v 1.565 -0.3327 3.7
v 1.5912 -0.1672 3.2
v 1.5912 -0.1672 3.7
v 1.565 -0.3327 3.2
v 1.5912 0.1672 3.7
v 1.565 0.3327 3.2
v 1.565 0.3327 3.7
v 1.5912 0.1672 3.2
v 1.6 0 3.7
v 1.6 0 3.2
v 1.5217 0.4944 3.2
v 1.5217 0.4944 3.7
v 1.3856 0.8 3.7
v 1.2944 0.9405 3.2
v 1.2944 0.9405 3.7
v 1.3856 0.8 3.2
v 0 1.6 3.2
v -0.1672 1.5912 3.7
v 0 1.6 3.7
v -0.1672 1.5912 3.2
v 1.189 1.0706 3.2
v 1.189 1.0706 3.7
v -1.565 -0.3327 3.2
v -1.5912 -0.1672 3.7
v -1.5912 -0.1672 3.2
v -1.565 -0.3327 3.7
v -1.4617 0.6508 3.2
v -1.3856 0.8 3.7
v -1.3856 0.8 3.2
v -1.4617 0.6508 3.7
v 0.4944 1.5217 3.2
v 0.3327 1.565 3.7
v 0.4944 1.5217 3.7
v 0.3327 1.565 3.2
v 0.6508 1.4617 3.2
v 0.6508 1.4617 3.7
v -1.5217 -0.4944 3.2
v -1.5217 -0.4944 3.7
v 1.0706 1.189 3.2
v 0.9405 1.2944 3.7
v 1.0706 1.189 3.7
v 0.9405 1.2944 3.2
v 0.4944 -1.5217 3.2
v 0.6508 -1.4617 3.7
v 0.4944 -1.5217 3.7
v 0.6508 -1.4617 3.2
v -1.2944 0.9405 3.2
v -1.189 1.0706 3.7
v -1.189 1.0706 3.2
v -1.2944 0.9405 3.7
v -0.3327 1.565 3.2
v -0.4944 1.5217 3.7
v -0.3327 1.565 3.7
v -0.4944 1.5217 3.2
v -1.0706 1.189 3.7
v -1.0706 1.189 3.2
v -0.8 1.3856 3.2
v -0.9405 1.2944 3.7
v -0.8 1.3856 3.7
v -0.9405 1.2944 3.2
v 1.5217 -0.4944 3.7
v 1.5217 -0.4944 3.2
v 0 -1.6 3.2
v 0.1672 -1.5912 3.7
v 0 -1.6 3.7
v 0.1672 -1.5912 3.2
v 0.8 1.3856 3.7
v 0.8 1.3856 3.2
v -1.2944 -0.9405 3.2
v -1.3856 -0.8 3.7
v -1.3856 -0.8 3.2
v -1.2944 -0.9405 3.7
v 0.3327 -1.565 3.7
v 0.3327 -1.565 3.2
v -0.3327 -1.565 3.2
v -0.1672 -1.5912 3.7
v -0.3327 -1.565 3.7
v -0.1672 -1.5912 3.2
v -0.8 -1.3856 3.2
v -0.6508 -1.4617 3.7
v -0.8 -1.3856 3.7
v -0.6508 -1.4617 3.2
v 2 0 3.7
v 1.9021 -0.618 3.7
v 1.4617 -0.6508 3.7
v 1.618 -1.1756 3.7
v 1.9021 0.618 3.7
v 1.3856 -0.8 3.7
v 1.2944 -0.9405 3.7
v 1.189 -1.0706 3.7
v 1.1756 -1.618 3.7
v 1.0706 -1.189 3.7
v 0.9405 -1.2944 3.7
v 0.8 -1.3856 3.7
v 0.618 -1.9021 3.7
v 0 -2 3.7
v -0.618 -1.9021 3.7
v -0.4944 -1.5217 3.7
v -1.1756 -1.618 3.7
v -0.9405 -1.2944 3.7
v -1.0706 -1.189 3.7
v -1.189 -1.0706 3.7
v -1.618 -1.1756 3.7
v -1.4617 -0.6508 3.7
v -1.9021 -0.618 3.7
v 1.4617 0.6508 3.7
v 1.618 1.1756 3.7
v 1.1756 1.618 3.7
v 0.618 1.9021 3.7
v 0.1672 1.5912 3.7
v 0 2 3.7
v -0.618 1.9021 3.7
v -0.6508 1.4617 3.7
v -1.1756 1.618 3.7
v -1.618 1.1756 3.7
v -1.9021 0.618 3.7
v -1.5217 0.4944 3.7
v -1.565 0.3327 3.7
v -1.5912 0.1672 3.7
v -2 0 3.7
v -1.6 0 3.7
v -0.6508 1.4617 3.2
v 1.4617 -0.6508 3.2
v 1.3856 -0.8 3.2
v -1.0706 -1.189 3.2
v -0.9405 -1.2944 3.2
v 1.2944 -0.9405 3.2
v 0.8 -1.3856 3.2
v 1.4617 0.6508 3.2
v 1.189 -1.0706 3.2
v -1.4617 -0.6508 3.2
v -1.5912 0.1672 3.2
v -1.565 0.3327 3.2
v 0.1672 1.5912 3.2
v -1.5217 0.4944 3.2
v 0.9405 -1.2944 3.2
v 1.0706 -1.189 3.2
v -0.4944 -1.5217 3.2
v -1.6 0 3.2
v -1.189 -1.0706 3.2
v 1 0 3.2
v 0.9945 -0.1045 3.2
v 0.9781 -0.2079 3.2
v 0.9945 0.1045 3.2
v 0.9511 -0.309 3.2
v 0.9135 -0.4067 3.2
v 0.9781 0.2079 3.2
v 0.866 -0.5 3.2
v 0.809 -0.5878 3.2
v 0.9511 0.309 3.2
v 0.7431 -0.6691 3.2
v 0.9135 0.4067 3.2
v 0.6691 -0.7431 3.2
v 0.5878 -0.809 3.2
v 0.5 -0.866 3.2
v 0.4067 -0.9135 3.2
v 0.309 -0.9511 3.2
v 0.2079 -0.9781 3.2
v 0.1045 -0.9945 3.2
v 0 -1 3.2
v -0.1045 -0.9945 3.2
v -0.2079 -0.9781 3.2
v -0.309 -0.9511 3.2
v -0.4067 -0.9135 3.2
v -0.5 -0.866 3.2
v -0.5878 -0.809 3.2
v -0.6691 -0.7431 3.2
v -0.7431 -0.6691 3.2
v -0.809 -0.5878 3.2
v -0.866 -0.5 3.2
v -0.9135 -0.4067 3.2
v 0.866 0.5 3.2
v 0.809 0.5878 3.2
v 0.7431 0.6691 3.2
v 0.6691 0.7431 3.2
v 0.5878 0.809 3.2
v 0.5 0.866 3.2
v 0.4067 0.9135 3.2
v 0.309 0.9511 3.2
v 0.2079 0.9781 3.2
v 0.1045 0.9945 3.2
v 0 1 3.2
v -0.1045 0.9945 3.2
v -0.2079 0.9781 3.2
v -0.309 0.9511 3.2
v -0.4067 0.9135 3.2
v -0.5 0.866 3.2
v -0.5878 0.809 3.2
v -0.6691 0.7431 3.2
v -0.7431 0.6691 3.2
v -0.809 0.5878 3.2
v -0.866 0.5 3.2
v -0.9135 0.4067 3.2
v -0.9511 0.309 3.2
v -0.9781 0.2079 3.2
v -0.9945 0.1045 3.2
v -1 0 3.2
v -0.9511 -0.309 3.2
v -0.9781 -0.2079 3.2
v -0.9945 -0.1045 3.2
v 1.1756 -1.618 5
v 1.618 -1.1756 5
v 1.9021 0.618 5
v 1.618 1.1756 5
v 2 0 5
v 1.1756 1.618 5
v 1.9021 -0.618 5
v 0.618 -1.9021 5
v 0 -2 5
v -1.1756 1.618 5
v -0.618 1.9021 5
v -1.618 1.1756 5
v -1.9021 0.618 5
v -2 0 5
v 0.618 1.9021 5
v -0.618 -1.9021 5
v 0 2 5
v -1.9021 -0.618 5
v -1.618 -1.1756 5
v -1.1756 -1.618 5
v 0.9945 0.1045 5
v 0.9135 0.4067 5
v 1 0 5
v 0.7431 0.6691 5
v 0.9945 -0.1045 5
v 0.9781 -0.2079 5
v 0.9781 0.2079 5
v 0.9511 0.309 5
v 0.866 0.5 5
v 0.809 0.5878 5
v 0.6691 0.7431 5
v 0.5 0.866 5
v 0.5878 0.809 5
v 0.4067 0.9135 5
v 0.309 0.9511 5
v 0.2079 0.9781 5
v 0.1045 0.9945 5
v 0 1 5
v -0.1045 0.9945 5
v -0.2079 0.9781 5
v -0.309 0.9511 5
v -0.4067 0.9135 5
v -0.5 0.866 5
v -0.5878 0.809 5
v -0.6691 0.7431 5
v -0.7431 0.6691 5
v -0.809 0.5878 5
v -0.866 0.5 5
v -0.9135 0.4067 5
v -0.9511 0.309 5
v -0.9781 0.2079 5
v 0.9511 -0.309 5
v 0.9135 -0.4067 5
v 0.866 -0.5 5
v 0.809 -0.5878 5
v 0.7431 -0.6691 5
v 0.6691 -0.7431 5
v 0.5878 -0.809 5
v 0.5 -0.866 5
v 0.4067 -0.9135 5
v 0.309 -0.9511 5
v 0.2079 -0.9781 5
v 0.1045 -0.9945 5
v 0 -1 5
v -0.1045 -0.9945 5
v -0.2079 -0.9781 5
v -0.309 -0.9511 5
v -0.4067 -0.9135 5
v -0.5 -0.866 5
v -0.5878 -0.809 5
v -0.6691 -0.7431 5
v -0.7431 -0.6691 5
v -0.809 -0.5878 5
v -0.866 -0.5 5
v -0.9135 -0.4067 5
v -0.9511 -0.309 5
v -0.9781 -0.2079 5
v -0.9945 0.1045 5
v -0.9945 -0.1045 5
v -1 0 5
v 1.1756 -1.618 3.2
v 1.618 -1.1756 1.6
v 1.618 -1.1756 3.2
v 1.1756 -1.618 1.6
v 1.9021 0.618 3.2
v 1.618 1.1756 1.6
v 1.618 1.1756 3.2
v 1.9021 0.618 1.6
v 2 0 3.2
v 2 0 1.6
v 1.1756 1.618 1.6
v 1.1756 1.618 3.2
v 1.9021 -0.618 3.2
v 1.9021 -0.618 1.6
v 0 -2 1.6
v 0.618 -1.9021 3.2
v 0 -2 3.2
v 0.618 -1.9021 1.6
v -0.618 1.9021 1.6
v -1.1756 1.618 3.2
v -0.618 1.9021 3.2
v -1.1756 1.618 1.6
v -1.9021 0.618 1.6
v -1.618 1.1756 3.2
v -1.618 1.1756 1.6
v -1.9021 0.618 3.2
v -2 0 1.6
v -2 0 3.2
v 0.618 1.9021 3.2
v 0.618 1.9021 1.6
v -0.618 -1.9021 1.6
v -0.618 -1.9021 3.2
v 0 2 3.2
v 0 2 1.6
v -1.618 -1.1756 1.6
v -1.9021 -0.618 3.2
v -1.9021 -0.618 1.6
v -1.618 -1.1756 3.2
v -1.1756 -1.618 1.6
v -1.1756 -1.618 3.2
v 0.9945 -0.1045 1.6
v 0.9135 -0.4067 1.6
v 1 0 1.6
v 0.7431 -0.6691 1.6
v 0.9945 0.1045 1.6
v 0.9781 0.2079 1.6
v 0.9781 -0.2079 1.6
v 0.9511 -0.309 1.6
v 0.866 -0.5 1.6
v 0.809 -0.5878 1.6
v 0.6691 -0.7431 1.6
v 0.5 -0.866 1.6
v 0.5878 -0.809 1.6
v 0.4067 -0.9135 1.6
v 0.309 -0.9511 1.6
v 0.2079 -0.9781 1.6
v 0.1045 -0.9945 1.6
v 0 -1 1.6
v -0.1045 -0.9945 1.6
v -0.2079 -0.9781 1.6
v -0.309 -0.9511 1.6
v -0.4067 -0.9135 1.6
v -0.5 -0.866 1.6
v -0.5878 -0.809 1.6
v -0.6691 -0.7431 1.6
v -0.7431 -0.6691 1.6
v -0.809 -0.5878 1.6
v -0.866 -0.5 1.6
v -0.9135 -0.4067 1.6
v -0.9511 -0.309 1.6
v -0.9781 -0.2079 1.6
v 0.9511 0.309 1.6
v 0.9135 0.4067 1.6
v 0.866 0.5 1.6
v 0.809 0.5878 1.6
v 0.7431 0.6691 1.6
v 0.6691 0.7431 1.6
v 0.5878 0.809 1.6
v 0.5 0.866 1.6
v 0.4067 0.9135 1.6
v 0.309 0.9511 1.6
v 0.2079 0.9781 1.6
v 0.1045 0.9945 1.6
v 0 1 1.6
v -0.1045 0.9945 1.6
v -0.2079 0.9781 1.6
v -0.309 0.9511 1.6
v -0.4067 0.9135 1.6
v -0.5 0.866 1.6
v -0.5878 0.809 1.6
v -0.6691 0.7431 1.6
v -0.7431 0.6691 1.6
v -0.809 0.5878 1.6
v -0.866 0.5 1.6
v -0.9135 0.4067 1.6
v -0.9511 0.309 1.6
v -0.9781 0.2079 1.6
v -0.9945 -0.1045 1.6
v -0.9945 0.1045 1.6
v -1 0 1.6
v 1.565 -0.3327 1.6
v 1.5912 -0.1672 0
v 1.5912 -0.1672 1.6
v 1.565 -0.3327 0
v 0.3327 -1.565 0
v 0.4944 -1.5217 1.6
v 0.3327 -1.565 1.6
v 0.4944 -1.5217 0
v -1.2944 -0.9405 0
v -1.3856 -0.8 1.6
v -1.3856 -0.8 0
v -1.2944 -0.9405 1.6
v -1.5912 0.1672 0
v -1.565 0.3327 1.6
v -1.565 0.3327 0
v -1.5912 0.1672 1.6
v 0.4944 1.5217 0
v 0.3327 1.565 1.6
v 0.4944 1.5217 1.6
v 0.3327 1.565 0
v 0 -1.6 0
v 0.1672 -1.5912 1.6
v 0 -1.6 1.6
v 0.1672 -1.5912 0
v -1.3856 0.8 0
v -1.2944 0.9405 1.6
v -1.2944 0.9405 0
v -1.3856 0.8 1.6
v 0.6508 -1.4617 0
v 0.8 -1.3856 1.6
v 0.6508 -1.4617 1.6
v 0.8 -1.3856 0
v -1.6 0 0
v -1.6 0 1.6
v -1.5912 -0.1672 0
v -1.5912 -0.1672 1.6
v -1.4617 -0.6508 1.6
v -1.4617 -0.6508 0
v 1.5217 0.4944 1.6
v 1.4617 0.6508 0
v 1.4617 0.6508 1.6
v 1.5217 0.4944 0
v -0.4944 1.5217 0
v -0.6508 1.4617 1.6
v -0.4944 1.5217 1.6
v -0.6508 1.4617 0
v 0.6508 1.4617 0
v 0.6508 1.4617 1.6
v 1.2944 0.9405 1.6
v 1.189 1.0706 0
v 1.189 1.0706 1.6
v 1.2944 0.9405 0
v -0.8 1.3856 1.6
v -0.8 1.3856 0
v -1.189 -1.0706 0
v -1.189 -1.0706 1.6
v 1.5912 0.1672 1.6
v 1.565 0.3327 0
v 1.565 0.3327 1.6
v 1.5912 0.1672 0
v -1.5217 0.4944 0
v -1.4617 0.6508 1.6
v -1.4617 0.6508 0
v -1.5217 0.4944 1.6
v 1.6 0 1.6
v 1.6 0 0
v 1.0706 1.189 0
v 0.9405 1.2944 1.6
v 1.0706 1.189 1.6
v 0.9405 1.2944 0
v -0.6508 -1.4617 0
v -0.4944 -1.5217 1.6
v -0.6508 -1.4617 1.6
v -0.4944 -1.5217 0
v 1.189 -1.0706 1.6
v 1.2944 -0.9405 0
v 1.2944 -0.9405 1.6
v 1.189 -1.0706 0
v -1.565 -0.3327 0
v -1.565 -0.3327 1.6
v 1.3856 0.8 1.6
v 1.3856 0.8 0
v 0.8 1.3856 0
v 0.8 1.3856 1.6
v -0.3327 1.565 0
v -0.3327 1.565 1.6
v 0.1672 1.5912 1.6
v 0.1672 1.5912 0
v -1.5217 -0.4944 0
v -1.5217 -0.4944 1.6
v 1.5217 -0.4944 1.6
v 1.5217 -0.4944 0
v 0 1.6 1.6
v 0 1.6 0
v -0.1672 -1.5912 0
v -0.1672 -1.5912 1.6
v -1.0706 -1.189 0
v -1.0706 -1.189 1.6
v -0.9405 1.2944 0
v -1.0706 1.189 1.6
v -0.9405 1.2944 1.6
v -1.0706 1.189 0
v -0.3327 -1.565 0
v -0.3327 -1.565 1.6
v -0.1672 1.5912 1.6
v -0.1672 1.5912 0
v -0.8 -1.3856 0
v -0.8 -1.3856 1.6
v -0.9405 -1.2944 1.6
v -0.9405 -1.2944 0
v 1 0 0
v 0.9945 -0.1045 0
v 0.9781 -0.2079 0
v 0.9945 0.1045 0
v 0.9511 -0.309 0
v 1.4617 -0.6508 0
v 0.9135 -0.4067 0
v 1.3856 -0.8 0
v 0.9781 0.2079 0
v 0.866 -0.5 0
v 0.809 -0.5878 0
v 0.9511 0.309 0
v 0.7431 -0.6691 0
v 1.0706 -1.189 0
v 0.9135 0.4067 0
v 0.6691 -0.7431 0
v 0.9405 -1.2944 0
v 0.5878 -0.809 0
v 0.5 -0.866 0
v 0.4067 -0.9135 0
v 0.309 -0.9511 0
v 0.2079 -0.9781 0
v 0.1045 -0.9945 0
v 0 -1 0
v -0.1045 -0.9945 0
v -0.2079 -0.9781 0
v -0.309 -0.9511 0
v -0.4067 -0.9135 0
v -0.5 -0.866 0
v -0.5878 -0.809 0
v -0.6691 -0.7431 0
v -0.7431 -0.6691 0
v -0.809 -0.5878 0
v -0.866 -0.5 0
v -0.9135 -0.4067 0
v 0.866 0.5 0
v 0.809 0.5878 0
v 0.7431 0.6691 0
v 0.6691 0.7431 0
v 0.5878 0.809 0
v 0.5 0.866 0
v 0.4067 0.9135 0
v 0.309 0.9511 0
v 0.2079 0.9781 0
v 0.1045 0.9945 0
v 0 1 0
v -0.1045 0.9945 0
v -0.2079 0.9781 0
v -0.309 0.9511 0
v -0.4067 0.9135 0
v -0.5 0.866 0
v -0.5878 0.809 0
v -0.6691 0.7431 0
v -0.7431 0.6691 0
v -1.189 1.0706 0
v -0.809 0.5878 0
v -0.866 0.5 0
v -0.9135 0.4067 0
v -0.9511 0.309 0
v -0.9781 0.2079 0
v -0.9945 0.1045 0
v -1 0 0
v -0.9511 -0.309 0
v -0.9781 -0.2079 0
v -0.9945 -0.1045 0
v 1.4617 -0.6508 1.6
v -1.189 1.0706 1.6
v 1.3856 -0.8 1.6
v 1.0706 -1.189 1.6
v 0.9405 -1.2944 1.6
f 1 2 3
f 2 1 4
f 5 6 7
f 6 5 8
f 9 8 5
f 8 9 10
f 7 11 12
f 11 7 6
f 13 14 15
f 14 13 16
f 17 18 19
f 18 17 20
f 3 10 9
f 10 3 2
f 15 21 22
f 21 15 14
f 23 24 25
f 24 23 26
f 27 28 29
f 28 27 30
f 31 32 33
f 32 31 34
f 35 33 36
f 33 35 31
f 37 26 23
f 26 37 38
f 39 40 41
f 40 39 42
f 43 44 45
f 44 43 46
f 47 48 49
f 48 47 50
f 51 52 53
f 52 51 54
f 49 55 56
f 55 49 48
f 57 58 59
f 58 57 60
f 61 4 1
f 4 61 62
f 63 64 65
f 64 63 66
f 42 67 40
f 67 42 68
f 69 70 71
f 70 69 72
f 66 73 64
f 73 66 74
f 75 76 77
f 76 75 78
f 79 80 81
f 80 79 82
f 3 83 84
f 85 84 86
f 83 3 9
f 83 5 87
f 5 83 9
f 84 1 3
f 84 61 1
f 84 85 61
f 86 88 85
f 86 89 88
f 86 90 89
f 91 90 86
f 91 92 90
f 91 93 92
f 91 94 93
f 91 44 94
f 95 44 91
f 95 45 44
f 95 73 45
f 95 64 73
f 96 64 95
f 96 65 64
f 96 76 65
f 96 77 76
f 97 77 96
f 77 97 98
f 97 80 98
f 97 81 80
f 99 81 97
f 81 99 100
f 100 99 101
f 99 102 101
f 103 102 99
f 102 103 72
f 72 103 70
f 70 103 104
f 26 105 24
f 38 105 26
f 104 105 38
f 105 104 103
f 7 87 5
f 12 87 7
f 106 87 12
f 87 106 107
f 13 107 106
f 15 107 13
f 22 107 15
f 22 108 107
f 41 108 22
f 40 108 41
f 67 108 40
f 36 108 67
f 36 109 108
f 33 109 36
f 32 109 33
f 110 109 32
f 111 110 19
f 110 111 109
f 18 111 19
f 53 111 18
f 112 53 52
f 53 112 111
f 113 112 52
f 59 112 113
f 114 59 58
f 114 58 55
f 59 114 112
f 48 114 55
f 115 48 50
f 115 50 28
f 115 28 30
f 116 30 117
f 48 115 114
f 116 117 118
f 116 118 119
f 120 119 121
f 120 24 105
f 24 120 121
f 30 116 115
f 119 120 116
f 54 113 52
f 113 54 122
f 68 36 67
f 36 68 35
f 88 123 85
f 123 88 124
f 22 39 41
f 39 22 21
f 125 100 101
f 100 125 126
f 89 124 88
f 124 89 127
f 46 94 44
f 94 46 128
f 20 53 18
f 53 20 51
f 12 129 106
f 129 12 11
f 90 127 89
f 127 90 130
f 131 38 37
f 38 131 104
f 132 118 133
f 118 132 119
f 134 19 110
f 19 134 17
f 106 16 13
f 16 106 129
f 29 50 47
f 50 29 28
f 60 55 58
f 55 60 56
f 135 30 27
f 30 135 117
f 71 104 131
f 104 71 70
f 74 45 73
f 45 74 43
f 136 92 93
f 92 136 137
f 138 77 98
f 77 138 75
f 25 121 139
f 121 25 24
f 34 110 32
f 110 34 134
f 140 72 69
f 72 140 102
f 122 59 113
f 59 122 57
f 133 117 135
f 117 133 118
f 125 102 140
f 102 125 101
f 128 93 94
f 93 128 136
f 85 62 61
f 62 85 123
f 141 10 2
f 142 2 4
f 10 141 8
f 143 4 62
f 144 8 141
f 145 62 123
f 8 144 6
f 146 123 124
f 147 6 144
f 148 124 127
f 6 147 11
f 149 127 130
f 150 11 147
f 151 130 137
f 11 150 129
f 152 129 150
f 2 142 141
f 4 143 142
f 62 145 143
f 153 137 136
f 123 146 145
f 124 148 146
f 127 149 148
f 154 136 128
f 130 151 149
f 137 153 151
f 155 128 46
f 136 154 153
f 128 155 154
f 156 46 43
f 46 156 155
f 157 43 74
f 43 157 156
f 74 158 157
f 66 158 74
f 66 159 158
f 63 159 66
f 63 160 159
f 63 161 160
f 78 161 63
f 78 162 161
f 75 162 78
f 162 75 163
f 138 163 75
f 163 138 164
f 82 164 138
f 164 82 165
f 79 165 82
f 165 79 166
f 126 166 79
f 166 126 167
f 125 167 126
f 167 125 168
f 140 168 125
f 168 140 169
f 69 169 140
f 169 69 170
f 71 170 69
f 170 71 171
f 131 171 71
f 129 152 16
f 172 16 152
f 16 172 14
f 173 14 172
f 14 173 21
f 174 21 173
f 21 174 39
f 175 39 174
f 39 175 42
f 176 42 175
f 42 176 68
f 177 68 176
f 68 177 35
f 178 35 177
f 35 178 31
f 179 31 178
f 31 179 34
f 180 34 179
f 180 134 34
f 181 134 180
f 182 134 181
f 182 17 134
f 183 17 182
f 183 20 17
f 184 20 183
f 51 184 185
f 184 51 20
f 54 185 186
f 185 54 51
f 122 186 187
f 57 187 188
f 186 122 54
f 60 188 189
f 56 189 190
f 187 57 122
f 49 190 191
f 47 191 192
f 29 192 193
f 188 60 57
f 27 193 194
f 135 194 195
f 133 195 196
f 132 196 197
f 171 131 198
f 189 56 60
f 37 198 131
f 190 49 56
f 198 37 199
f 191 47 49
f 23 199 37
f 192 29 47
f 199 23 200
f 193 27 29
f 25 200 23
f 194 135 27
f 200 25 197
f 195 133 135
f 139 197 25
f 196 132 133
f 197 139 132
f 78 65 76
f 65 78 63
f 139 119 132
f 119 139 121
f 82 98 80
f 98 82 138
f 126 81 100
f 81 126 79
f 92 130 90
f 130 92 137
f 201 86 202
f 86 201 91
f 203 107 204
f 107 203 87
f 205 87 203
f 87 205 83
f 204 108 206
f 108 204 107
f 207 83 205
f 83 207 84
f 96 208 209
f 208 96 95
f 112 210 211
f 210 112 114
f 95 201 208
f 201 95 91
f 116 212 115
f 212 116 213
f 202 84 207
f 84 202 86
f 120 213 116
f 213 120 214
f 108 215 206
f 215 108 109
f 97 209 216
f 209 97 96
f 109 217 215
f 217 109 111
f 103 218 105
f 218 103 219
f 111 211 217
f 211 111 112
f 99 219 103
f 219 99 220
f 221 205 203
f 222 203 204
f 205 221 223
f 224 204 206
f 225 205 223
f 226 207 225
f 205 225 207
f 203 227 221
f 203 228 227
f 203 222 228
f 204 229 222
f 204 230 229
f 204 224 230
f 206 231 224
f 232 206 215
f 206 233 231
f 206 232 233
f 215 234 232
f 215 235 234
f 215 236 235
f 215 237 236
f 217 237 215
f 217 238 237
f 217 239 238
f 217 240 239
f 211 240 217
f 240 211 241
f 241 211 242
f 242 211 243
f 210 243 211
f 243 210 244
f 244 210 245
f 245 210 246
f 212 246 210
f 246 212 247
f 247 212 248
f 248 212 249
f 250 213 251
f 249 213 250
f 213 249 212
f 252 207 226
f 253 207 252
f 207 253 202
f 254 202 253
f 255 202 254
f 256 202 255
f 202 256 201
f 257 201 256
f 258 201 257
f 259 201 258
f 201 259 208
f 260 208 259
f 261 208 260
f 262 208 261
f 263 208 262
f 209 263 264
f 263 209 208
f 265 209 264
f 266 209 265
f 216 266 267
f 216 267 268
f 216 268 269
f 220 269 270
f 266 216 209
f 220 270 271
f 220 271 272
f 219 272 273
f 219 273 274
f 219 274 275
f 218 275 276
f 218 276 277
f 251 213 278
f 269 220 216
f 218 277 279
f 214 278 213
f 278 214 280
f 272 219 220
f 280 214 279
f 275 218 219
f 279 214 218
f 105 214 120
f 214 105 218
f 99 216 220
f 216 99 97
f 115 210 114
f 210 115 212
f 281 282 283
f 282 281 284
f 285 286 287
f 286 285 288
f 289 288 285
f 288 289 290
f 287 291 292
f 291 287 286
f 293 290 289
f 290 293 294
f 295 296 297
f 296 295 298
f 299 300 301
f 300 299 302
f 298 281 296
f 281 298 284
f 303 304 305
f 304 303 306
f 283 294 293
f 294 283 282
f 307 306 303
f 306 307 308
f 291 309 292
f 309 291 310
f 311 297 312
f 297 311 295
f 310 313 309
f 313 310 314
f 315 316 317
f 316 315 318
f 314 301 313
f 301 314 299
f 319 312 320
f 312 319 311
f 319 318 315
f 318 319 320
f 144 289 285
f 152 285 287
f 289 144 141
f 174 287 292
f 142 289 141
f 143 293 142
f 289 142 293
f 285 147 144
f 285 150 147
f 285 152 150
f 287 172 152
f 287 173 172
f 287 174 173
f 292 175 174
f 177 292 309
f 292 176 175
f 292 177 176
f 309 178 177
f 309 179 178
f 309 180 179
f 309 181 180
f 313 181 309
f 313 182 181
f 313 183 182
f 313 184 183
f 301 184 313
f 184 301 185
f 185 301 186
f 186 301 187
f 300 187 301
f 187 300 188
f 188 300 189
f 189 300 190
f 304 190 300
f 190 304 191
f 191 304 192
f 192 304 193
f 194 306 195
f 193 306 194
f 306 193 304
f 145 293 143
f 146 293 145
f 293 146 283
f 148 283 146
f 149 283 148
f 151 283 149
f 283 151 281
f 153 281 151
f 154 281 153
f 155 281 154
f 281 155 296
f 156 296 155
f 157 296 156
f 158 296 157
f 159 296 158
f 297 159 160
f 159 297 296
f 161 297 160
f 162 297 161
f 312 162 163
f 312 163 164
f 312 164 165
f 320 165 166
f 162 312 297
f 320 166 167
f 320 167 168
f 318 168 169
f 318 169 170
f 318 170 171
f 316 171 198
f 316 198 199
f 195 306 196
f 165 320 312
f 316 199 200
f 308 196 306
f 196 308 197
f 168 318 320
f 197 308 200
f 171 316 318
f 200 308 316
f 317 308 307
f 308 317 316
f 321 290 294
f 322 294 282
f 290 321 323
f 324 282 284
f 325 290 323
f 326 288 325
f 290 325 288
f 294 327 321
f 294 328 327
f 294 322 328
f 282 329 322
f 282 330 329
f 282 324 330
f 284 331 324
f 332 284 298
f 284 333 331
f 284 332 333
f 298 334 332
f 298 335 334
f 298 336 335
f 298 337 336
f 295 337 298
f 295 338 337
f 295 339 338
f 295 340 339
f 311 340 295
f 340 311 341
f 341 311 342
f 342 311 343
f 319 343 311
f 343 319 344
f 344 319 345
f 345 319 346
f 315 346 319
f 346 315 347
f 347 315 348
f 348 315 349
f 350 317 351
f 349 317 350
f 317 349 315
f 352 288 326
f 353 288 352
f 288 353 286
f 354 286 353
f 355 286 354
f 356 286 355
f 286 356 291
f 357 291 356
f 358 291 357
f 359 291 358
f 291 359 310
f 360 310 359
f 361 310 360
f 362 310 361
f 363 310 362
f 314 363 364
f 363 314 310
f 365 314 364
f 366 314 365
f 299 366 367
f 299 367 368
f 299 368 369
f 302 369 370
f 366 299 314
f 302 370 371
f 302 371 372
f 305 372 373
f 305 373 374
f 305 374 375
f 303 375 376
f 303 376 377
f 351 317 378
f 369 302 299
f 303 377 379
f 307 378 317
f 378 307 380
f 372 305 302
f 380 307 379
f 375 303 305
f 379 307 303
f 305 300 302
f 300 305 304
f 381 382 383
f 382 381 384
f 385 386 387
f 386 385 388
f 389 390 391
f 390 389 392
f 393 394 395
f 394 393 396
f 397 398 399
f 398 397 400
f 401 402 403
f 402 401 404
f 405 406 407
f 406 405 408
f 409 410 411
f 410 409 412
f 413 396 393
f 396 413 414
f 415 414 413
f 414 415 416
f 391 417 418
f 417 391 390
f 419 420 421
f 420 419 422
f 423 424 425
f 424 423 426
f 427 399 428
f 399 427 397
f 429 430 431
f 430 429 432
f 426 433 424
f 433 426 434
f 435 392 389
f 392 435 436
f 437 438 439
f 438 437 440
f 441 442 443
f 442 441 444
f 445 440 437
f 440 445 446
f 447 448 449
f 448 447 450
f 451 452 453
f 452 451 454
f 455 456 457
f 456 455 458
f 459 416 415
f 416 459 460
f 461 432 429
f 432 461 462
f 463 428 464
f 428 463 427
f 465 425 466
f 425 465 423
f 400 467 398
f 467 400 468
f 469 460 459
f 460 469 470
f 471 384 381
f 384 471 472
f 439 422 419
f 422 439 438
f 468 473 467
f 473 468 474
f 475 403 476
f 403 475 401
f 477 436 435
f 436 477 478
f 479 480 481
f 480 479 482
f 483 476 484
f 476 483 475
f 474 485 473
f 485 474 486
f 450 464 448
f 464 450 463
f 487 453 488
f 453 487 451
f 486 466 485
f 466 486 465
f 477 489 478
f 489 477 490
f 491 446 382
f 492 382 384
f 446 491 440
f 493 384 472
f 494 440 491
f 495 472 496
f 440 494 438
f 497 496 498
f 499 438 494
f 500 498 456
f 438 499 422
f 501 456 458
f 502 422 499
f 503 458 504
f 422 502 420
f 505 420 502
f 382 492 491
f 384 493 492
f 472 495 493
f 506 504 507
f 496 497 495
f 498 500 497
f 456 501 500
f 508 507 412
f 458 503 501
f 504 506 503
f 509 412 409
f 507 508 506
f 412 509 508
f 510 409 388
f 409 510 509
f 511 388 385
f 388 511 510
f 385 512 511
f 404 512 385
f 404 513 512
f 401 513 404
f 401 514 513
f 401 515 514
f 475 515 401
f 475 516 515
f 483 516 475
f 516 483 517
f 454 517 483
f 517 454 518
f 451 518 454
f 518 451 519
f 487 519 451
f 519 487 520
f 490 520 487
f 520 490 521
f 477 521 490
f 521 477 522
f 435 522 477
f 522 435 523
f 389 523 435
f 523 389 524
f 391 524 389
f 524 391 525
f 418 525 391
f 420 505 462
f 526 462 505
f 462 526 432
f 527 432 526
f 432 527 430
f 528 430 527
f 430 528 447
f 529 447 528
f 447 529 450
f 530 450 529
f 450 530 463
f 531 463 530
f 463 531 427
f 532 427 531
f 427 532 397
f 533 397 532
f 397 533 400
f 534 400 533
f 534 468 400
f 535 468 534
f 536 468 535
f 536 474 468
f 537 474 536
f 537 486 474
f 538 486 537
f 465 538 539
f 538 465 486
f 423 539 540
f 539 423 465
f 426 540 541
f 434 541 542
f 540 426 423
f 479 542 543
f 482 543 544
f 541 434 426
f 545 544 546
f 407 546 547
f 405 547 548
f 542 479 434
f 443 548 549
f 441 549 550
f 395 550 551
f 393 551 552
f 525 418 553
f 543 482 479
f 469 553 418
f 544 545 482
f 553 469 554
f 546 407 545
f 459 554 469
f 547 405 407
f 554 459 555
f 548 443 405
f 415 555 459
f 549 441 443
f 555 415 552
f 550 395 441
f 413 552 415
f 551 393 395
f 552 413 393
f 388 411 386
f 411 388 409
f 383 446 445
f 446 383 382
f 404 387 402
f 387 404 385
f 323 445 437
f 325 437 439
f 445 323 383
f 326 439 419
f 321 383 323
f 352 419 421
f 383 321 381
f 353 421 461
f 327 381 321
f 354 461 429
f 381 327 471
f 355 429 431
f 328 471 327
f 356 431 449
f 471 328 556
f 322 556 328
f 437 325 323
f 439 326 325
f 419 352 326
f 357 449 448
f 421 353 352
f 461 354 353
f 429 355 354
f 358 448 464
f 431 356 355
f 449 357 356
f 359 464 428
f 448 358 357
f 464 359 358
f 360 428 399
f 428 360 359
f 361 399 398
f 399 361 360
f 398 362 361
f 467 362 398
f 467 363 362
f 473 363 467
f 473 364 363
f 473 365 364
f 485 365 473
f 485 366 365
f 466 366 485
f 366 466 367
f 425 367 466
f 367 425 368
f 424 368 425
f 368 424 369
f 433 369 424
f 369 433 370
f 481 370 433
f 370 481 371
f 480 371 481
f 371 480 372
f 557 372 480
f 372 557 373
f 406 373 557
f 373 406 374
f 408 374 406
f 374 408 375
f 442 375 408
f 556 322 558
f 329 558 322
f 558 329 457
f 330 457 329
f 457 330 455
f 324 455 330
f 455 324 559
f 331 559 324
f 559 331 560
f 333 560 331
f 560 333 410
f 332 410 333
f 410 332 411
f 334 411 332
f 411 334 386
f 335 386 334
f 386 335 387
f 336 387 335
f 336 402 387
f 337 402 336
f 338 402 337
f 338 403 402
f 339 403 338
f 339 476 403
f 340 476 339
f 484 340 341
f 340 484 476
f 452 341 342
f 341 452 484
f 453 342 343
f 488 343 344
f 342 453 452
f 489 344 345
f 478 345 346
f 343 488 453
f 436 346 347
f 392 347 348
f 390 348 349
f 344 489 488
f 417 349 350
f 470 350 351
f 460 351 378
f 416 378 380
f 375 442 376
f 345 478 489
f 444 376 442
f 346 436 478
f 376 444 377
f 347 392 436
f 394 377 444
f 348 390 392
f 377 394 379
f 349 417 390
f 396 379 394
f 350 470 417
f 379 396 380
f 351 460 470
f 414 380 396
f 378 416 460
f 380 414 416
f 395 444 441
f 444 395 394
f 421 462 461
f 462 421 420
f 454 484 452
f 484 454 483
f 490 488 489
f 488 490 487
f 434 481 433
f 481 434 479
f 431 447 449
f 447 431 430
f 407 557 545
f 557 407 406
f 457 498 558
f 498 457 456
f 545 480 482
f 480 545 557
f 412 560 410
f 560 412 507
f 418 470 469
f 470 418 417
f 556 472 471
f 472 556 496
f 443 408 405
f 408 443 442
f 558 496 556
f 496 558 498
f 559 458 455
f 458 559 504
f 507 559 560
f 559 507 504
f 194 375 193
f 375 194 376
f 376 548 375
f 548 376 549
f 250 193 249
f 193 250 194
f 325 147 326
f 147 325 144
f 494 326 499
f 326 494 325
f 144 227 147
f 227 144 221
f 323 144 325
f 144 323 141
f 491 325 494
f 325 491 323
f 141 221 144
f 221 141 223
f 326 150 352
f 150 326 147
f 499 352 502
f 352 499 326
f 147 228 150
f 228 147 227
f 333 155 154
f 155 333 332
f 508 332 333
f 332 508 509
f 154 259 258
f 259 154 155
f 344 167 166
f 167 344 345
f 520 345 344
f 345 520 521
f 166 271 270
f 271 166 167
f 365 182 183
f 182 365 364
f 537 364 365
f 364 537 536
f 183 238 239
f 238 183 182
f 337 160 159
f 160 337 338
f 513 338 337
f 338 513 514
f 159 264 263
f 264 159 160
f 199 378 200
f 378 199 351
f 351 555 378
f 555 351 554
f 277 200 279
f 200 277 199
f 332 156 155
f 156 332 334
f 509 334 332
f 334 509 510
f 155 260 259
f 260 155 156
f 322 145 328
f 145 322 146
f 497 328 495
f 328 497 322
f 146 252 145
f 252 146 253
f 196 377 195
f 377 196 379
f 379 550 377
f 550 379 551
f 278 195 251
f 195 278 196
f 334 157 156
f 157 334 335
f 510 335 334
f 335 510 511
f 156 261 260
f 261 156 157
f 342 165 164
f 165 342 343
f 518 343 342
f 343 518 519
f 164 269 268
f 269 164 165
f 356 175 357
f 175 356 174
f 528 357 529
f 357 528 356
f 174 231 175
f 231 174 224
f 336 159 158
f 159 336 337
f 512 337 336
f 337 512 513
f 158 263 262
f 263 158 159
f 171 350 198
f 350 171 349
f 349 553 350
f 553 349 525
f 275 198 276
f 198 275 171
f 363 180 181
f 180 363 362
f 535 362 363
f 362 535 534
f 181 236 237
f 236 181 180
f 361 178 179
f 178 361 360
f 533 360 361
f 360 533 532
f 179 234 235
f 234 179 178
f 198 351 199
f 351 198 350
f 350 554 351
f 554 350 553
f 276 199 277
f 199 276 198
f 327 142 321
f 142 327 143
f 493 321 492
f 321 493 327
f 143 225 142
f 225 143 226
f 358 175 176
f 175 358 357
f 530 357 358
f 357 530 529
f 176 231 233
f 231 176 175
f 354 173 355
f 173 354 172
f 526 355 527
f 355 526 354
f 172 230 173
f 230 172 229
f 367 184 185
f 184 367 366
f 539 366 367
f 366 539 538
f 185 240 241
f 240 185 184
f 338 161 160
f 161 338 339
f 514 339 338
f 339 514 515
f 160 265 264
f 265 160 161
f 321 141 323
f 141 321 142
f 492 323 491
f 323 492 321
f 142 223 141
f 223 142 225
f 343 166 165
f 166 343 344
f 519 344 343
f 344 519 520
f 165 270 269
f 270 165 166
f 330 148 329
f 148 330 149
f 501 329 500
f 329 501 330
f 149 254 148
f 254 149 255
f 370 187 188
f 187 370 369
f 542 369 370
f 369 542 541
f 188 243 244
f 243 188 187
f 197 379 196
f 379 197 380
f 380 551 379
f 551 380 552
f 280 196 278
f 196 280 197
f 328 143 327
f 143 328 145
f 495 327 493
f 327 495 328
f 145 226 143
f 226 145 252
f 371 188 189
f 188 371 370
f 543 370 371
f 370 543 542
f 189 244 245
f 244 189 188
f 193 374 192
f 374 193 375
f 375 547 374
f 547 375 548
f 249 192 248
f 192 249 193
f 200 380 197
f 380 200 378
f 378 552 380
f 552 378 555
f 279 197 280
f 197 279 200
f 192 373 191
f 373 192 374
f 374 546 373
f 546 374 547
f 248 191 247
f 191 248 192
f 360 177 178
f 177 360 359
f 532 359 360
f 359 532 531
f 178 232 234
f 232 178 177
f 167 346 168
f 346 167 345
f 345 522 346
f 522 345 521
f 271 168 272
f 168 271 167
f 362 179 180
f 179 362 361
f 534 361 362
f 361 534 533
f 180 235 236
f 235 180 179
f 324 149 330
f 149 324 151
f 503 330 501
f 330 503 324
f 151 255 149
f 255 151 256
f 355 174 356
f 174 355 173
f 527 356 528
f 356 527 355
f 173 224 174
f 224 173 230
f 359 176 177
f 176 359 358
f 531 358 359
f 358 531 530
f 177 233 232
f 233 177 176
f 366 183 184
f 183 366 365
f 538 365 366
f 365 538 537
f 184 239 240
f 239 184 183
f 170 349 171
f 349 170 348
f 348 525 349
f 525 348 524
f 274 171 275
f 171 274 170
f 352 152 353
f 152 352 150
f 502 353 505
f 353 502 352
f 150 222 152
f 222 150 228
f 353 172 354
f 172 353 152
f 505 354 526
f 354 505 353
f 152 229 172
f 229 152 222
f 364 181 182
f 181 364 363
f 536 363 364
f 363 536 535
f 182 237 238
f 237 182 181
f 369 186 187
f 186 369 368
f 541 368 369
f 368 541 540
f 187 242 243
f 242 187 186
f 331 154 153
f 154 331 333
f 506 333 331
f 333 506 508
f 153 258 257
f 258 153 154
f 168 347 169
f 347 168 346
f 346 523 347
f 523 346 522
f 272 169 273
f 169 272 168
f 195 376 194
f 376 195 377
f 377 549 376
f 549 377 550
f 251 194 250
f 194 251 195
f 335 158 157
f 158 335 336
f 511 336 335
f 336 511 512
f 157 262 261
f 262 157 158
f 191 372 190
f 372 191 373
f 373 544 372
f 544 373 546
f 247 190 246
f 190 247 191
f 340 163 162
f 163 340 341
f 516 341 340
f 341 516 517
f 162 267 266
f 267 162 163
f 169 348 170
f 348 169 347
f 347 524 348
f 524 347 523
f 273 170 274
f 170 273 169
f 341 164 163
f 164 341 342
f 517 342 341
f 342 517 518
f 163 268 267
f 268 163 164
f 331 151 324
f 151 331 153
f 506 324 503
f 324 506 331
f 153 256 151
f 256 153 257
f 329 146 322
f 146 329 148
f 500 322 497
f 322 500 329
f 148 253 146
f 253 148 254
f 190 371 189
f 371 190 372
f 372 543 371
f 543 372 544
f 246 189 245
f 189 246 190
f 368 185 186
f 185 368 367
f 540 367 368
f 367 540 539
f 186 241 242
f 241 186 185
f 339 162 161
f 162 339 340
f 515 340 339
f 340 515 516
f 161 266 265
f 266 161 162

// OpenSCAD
/**
 * Module: Placeholder for heat insert nut
 *
 * Author: Karim Aziiev <karim.aziiev@gmail.com>
 * License: GPL-3.0-or-later
 */

include <../colors.scad>

use <../lib/functions.scad>
use <../lib/plist.scad>
use <../lib/slots.scad>
use <../lib/transforms.scad>
use <bolt.scad>

heat_insert_plist_example = ["h", 5,
                             "d", 3.2,
                             "flang_d", 4,
                             "flang_h", 1.6,
                             "top_flang_h", 1.3,
                             "bottom_flat_h", 1.6,
                             "hole_d", 2];

/**
  ─────────────────────────────────────────────────────────────────────────────
  heat_insert_nut_props
  ─────────────────────────────────────────────────────────────────────────────

  Resolve insert dimensions and the maximum diameter of its mounting cutter.

  **Parameters:**
  - `plist`: Physical dimensions in mm, as accepted by heat_insert_nut_from_plist.

  **Returns:**
  The plist with optional dimensions/defaults resolved, plus outer_d, inner_h,
  slot_d, bore_d, bore_h, slot_bottom and slot_top. Unreversed cutter Z bounds
  include its boolean overshoot; the hardware occupies Z=0..h. slot_d includes both shaft
  and knurl clearances. The lower flange can interfere with the printed pocket
  before heat insertion; the cutter is not a clearance envelope of the hardware.
 */
function heat_insert_nut_props(plist) =
  let (h = plist_get("h", plist),
       d = plist_get("d", plist),
       hole_d = plist_get("hole_d", plist),
       flang_d = with_default(plist_get("flang_d", plist), d),
       flang_h = with_default(plist_get("flang_h", plist), 0),
       top_h = with_default(plist_get("top_flang_h", plist), flang_h),
       flat_h = with_default(plist_get("bottom_flat_h", plist), 0),
       clearance = with_default(plist_get("clearance", plist), 0.2),
       knurl_clearance = with_default(plist_get("knurl_clearance", plist), 0.6),
       taper = with_default(plist_get("use_taper", plist), false),
       bore_h = flat_h + flang_h / 2,
       bore_d = max(flang_d, d) + knurl_clearance,
       inner_h = h - flang_h - top_h - flat_h,
       slot_offset = 0.1,
       overshoot = 0.2)
  assert(is_num(h) && h > 0 && is_num(d) && d > 0
         && is_num(hole_d) && hole_d > 0 && hole_d < min(d, flang_d),
         "Insert height/diameters must be positive, with material around its thread")
  assert(min([flang_h, top_h, flat_h, inner_h, clearance, knurl_clearance]) >= 0,
         "Insert segments must fit h and clearances must be nonnegative")
  assert(!taper || h > bore_h + flat_h, "Insert taper needs positive height")
  plist_merge(plist,
              ["h", h,
               "d", d,
               "hole_d", hole_d,
               "flang_d", flang_d,
               "flang_h", flang_h,
               "top_flang_h", top_h,
               "bottom_flat_h", flat_h,
               "clearance", clearance,
               "knurl_clearance", knurl_clearance,
               "use_taper", taper,
               "bolt_head_type", with_default(plist_get("bolt_head_type", plist), "pan"),
               "outer_d", max(d, flang_d),
               "inner_h", inner_h,
               "slot_d", max(d + clearance, bore_h > 0 || taper ? bore_d : 0),
               "bore_d", bore_d,
               "bore_h", bore_h,
               "slot_offset", slot_offset,
               "slot_overshoot", overshoot,
               "slot_bottom", slot_offset - overshoot,
               "slot_top", h + slot_offset + overshoot]);

module heat_insert_nut(h,
                       d,
                       hole_d,
                       flang_d,
                       flang_h,
                       top_flang_h,
                       bottom_flat_h,
                       fn1=60,
                       fn2=20,
                       color=metallic_gold_2,
                       clearance=0.2,
                       knurl_clearance=0.6,
                       use_taper=false,
                       bolt_head_type="pan",
                       show_bolt=false,
                       reverse=false,
                       slot_mode=false,
                       anchor=[0, 0, 1],
                       bolt_l,
                       bolt_head_offset=0) {
  props = heat_insert_nut_props(["h", h,
                                 "d", d,
                                 "hole_d", hole_d,
                                 "flang_d", flang_d,
                                 "flang_h", flang_h,
                                 "top_flang_h", top_flang_h,
                                 "bottom_flat_h", bottom_flat_h,
                                 "clearance", clearance,
                                 "knurl_clearance", knurl_clearance,
                                 "use_taper", use_taper,
                                 "bolt_head_type", bolt_head_type]);
  bottom_flat_h = plist_get("bottom_flat_h", props);
  flang_d = plist_get("flang_d", props);
  flang_h = plist_get("flang_h", props);
  top_flang_h = plist_get("top_flang_h", props);
  inner_h = plist_get("inner_h", props);
  clearance = plist_get("clearance", props);
  use_taper = plist_get("use_taper", props);
  bolt_head_type = plist_get("bolt_head_type", props);
  bolt_l = with_default(bolt_l, h);
  fn1 = with_default(fn1, 60);
  fn2 = with_default(fn2, 20);
  color = with_default(color, metallic_gold_2);

  module _slot() {
    cbore_d = plist_get("bore_d", props);
    cbore_h = plist_get("bore_h", props);
    insert_d = d + clearance;
    translate([0, 0, plist_get("slot_offset", props)]) {
      counterbore(h=h,
                  d=insert_d,
                  bore_d=cbore_d,
                  bore_h=cbore_h,
                  sink=false,
                  fn=50,
                  autoscale_step=plist_get("slot_overshoot", props),
                  reverse=false);
    }
    if (use_taper) {
      translate([0, 0, bottom_flat_h]) {
        cylinder(d1=insert_d,
                 d2=cbore_d,
                 h=h - cbore_h - bottom_flat_h,
                 $fn=50);
      }
    }
  }

  with_anchor(anchor=anchor, size=[d, d, h], centered=true) {
    translate([0, 0, reverse ? h : 0]) {
      maybe_rotate([reverse ? 180 : 0, 0, 0]) {
        if (slot_mode) {
          _slot();
        } else  {
          color(color, alpha=1) {
            difference() {
              union() {
                cylinder(d=d, h=bottom_flat_h, $fn=fn1);
                translate([0, 0, bottom_flat_h]) {
                  cylinder(d=flang_d, h=flang_h, $fn=fn2);
                  translate([0, 0, flang_h]) {
                    cylinder(d=d, h=inner_h, $fn=fn1);
                    translate([0, 0, inner_h]) {
                      cylinder(d=flang_d, h=top_flang_h, $fn=fn2);
                    }
                  }
                }
              }
              translate([0, 0, -0.5]) {
                cylinder(d=hole_d, h=h + 1, $fn=fn1);
              }
            }
          }
          if (show_bolt) {
            translate([0, 0, h + bolt_head_offset - bolt_l]) {
              bolt(d=hole_d, h=bolt_l, head_type=bolt_head_type);
            }
          }
        }
      }
    }
  }
}

/**
  ─────────────────────────────────────────────────────────────────────────────
  heat_insert_nut_from_plist
  ─────────────────────────────────────────────────────────────────────────────

  Render a heat insert, its mounting cutter, or a cutter/hardware debug overlay.

  **Parameters:**
  - `plist`: Insert dimensions, clearances, taper, color and facet counts.
  - `show_bolt`: Show a screw entering the top of the insert in solid mode.
  - `reverse`: Reverse hardware and cutters together along Z.
  - `slot_mode`: Emit the mounting cutter instead of hardware.
  - `debug`: Overlay the cutter as background geometry on the hardware.
  - `anchor`: Shared reference anchor, centered on the body diameter in XY.
  - `bolt_l`: Screw length; defaults to plist bolt_l or insert height.
  - `bolt_head_offset`: Distance from the insert top to the screw head's
    underside, along local +Z before reversal; useful for lids/exploded views.
 */
module heat_insert_nut_from_plist(plist,
                                  show_bolt=false,
                                  reverse=false,
                                  slot_mode=false,
                                  debug=false,
                                  anchor=[0, 0, 1],
                                  bolt_l,
                                  bolt_head_offset=0) {
  h = plist_get("h", plist);
  d = plist_get("d", plist);
  hole_d = plist_get("hole_d", plist);
  flang_d = plist_get("flang_d", plist);
  flang_h = plist_get("flang_h", plist);
  top_flang_h = plist_get("top_flang_h", plist);
  bottom_flat_h = plist_get("bottom_flat_h", plist);
  fn1 = plist_get("fn1", plist);
  fn2 = plist_get("fn2", plist);
  color = plist_get("color", plist);
  clearance = plist_get("clearance", plist);
  knurl_clearance = plist_get("knurl_clearance", plist);
  use_taper = plist_get("use_taper", plist);
  bolt_head_type = plist_get("bolt_head_type", plist);
  module _heat_insert_nut(slot_mode=slot_mode) {
    heat_insert_nut(h=h,
                    d=d,
                    hole_d=hole_d,
                    flang_d=flang_d,
                    flang_h=flang_h,
                    top_flang_h=top_flang_h,
                    bottom_flat_h=bottom_flat_h,
                    fn1=fn1,
                    fn2=fn2,
                    color=color,
                    clearance=clearance,
                    knurl_clearance=knurl_clearance,
                    bolt_head_type=bolt_head_type,
                    use_taper=use_taper,
                    show_bolt=show_bolt,
                    bolt_l=with_default(bolt_l, plist_get("bolt_l", plist)),
                    bolt_head_offset=bolt_head_offset,
                    reverse=reverse,
                    slot_mode=slot_mode,
                    anchor=anchor);
  }
  if (debug) {
    %_heat_insert_nut(slot_mode=true);
    _heat_insert_nut(slot_mode=false);
  } else {
    _heat_insert_nut();
  }
}

heat_insert_nut_from_plist(heat_insert_plist_example);
